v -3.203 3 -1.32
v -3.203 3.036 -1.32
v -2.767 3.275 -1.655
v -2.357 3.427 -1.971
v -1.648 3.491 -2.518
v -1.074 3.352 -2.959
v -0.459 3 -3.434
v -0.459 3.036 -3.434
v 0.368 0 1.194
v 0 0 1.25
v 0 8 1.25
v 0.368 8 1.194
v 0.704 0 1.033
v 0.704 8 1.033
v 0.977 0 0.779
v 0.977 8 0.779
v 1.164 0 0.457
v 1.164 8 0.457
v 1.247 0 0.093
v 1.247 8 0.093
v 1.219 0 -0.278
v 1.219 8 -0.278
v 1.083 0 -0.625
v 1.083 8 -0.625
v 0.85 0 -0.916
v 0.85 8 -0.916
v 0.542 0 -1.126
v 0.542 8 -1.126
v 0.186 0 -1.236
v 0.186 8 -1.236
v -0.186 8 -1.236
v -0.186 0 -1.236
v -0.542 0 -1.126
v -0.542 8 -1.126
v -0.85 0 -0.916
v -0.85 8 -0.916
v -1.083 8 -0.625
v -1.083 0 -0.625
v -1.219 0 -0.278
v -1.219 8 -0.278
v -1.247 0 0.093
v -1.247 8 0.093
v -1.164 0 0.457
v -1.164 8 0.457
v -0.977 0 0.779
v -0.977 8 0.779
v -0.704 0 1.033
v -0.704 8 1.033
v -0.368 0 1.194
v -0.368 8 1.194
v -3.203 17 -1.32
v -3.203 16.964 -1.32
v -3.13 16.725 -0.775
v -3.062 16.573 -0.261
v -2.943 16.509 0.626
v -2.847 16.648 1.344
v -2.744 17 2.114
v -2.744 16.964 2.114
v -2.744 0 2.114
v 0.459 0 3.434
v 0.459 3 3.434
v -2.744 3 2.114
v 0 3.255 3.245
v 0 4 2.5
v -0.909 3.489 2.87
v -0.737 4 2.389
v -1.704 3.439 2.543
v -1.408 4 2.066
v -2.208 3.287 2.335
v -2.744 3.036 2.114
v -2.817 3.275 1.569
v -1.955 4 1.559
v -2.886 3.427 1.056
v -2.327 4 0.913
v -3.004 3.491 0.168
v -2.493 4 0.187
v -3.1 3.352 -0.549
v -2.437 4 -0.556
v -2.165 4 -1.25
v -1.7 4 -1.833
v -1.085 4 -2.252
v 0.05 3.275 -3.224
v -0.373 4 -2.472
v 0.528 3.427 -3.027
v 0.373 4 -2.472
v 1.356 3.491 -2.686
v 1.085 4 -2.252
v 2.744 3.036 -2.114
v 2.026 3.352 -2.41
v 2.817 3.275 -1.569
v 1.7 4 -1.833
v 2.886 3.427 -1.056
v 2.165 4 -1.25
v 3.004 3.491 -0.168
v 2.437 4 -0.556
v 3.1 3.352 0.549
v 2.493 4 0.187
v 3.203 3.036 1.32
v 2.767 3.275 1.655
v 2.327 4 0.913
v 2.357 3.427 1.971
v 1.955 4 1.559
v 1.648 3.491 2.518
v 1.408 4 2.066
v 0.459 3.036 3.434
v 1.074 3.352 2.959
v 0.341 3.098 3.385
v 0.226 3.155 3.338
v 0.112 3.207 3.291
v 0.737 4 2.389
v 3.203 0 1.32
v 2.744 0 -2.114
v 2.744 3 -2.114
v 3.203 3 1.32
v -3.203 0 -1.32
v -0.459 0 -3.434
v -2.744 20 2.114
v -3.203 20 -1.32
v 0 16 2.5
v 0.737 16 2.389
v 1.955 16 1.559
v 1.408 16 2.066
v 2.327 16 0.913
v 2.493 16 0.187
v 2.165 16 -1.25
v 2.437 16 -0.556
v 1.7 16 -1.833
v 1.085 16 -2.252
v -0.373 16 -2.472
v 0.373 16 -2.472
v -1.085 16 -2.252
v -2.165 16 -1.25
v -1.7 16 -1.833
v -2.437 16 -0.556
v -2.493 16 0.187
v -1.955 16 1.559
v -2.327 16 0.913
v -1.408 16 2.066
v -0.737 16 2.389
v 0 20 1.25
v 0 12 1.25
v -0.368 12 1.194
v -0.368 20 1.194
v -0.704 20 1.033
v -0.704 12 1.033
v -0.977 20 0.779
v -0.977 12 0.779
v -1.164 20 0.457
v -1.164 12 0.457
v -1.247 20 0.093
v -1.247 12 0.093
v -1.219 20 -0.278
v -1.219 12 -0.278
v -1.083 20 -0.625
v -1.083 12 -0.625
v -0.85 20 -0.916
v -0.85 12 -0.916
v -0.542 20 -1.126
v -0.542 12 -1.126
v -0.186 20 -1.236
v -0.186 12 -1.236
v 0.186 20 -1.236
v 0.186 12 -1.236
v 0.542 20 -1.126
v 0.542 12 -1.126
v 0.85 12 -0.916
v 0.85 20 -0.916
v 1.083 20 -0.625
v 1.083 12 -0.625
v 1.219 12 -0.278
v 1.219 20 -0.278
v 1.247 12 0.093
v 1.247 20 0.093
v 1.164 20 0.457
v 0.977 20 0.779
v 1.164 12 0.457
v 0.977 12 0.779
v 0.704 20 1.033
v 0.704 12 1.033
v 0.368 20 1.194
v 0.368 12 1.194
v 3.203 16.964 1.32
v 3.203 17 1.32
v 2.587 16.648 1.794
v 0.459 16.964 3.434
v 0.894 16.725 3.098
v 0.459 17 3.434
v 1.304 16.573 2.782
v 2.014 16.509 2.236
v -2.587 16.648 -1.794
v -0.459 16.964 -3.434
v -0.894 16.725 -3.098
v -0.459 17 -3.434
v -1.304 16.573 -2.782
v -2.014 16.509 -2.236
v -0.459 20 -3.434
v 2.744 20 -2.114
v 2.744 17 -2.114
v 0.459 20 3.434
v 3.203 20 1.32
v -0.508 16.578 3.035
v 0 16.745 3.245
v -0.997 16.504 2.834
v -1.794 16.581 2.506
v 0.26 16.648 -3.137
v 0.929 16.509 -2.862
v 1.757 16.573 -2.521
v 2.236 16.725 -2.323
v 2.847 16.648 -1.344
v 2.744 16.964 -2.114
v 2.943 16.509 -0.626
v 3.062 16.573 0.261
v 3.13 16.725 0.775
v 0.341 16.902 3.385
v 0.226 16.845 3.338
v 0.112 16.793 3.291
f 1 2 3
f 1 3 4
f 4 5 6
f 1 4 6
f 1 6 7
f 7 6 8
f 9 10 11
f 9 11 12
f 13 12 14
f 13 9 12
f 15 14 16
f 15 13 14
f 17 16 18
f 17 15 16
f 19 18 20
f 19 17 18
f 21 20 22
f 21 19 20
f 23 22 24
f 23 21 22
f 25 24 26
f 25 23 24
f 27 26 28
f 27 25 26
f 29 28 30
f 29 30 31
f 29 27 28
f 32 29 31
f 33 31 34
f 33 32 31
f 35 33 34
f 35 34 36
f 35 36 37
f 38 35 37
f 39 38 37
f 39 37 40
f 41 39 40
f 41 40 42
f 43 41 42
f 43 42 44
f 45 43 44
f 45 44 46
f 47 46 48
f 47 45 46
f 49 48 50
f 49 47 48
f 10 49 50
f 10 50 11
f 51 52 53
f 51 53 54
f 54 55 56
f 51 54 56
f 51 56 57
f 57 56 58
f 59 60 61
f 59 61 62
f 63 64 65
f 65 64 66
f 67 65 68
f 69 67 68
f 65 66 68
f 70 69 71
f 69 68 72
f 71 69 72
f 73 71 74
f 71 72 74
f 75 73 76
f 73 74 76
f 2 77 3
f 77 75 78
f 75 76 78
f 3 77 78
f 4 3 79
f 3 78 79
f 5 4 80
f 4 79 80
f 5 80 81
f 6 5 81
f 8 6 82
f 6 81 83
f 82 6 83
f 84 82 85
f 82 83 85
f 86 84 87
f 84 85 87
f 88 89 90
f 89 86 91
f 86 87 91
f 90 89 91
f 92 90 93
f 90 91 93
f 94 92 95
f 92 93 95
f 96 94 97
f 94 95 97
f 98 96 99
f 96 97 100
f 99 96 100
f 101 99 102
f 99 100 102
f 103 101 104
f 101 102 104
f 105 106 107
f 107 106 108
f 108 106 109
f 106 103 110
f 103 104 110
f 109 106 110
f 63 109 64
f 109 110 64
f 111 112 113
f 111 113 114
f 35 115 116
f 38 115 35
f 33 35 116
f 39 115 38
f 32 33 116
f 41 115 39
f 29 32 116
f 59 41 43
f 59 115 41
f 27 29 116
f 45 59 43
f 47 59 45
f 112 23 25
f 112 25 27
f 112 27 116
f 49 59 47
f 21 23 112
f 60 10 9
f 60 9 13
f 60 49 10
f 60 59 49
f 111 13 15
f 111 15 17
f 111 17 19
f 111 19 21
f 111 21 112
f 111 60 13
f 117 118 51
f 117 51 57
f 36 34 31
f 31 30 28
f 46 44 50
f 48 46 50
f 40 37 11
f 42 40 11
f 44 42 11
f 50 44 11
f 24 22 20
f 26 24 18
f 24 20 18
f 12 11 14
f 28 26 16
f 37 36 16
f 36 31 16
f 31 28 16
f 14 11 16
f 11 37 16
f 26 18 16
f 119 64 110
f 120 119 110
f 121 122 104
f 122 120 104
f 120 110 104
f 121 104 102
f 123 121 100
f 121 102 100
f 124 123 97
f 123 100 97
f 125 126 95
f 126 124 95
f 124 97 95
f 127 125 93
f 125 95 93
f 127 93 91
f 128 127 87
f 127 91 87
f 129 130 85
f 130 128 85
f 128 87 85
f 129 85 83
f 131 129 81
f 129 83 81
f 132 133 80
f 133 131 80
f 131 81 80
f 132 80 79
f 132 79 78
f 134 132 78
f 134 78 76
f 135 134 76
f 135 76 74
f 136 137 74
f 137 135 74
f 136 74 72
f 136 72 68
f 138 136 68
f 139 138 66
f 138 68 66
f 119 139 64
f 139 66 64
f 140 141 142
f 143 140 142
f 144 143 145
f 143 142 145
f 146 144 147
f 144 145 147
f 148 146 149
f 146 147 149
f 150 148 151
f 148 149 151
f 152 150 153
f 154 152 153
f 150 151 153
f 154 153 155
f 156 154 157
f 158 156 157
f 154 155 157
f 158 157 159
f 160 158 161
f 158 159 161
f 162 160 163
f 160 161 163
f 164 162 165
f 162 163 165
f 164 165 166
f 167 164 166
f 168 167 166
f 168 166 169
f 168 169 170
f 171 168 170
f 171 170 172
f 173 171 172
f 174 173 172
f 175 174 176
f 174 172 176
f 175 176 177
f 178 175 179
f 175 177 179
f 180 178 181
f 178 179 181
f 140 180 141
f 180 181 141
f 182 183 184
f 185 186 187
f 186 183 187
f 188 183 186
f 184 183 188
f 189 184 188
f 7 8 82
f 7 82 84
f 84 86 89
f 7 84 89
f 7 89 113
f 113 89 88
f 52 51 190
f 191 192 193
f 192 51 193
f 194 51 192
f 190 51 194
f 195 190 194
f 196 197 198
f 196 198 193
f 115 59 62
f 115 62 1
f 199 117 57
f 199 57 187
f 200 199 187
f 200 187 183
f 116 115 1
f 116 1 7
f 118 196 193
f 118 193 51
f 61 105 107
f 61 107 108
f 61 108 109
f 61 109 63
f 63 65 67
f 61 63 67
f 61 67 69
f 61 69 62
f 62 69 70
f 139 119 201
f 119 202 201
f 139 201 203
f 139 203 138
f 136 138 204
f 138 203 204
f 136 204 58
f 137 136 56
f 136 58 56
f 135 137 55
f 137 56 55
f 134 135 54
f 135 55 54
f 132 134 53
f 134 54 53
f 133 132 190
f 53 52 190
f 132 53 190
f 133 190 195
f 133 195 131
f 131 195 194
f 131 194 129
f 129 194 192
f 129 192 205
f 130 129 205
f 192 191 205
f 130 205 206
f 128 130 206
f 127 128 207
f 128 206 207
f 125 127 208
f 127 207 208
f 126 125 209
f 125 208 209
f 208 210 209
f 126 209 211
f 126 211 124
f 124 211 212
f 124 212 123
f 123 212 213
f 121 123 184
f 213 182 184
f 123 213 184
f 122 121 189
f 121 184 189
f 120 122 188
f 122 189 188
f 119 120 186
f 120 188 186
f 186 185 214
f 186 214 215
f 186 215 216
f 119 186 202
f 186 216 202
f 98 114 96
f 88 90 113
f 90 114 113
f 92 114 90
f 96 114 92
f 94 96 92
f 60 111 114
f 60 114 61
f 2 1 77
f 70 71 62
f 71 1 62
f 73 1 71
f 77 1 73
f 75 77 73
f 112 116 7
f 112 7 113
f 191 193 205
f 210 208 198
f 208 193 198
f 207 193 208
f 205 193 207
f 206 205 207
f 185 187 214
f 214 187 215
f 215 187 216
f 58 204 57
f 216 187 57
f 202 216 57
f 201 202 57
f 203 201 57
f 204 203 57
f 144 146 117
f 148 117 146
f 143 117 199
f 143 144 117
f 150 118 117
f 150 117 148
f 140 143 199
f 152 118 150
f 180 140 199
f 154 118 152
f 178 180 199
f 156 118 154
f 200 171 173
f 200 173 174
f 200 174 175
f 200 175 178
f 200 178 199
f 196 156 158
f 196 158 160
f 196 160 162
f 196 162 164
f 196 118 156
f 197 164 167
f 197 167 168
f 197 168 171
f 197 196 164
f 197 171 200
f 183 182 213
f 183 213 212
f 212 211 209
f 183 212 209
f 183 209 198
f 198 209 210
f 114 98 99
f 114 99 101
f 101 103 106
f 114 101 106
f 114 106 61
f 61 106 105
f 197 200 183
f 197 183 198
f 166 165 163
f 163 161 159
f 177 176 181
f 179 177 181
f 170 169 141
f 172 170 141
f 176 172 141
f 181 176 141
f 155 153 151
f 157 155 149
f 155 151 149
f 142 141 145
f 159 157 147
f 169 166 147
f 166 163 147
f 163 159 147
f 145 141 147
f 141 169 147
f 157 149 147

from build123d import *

# Parameters (mm, degrees)
SKETCH_1_R          = 2.5
EXTRUDE_1_DEPTH     = 20
EXTRUDE_2_DEPTH     = 3
EXTRUDE_3_DEPTH     = 3
CHAMFER_1_SIZE      = 1
SKETCH_4_R          = 1.25
CUT_EXTRUDE_1_DEPTH = 8
CUT_EXTRUDE_START   = 8
SKETCH_5_R          = 1.25
CUT_EXTRUDE_2_DEPTH = 8


with BuildPart() as part:
    # 草图1 → 凸台-拉伸1 (new body)
    with BuildSketch(Plane(origin=(0, 0, 0), x_dir=(1, 0, 0), z_dir=(0, 1, 0))):
        with Locations(Location((0, 0, 0), (0, 0, 270))):
            Circle(SKETCH_1_R)
    extrude(amount=EXTRUDE_1_DEPTH)

    # 草图2 → 凸台-拉伸2 (add)
    with BuildSketch(Plane(origin=(0, 20, 0), x_dir=(1, 0, 0), z_dir=(0, 1, 0))):
        Polygon((3.202903935, -1.319623577), (2.744279509, 2.113984385), (-0.458624426, 3.433607962), (-3.202903935, 1.319623577), (-2.744279509, -2.113984385), (0.458624426, -3.433607962), align=None)
    extrude(amount=-EXTRUDE_2_DEPTH)

    # 草图3 → 凸台-拉伸3 (add)
    with BuildSketch(Plane.XZ):
        Polygon((3.202903935, 1.319623577), (0.458624426, 3.433607962), (-2.744279509, 2.113984385), (-3.202903935, -1.319623577), (-0.458624426, -3.433607962), (2.744279509, -2.113984385), align=None)
    extrude(amount=-EXTRUDE_3_DEPTH)

    # 倒角1
    # the kernel refuses this chamfer: 1 mm, written as the material it adds along each edge
    with BuildSketch(Plane(origin=(0, 17, 0), x_dir=(0, 0, 1), z_dir=(1, 0, 0))) as chamfer_1_piece_1_section:
        Polygon((2.5, CHAMFER_1_SIZE), (2.5 + CHAMFER_1_SIZE, 0), (2.5, 0), align=None)
    chamfer_1_piece_1 = revolve(axis=Axis((0, 17, 0), (0, -1, 0)), mode=Mode.PRIVATE)
    chamfer_1_piece_1 = split(chamfer_1_piece_1, bisect_by=Plane(origin=(2.585980682, 16.482096178, -3.299128656), z_dir=(-0.9911972405355005, 0, 0.13239346794615373)), keep=Keep.TOP, mode=Mode.PRIVATE)
    chamfer_1_piece_1 = split(chamfer_1_piece_1, bisect_by=Plane(origin=(3.258731824, 16.482096178, 1.276618014), z_dir=(-0.61025472680424, 0, -0.7922052564917015)), keep=Keep.TOP, mode=Mode.PRIVATE)
    chamfer_1_piece_1 = split(chamfer_1_piece_1, bisect_by=Plane(origin=(0.102470937, 16.482096178, -3.202431915), z_dir=(-0.3809425137312606, 0, 0.924598724437855)), keep=Keep.TOP, mode=Mode.PRIVATE)
    chamfer_1_piece_1 = split(chamfer_1_piece_1, bisect_by=Plane(origin=(-2.183184145, 16.482096178, 2.345160432), z_dir=(0.38094251373126053, 0, -0.924598724437855)), keep=Keep.TOP, mode=Mode.PRIVATE)
    chamfer_1_piece_1 = split(chamfer_1_piece_1, bisect_by=Plane(origin=(-0.402796537, 16.482096178, -3.476613525), z_dir=(0.6102547268042401, 0, 0.7922052564917015)), keep=Keep.TOP, mode=Mode.PRIVATE)
    chamfer_1_piece_1 = split(chamfer_1_piece_1, bisect_by=Plane(origin=(-3.361202761, 16.482096178, -2.504767848), z_dir=(0.9911972405355005, 0, -0.1323934679461537)), keep=Keep.TOP, mode=Mode.PRIVATE)
    add(chamfer_1_piece_1)
    with BuildSketch(Plane(origin=(0, 3, 0), x_dir=(0, 0, 1), z_dir=(1, 0, 0))) as chamfer_1_piece_2_section:
        Polygon((2.5 + CHAMFER_1_SIZE, 0), (2.5, -CHAMFER_1_SIZE), (2.5, 0), align=None)
    chamfer_1_piece_2 = revolve(axis=Axis((0, 3, 0), (0, -1, 0)), mode=Mode.PRIVATE)
    chamfer_1_piece_2 = split(chamfer_1_piece_2, bisect_by=Plane(origin=(3.258731824, 3.517903822, 1.276618014), z_dir=(-0.61025472680424, 0, -0.7922052564917015)), keep=Keep.TOP, mode=Mode.PRIVATE)
    chamfer_1_piece_2 = split(chamfer_1_piece_2, bisect_by=Plane(origin=(2.585980682, 3.517903822, -3.299128656), z_dir=(-0.9911972405355005, 0, 0.13239346794615373)), keep=Keep.TOP, mode=Mode.PRIVATE)
    chamfer_1_piece_2 = split(chamfer_1_piece_2, bisect_by=Plane(origin=(-2.183184145, 3.517903822, 2.345160432), z_dir=(0.38094251373126053, 0, -0.924598724437855)), keep=Keep.TOP, mode=Mode.PRIVATE)
    chamfer_1_piece_2 = split(chamfer_1_piece_2, bisect_by=Plane(origin=(0.102470937, 3.517903822, -3.202431915), z_dir=(-0.3809425137312606, 0, 0.924598724437855)), keep=Keep.TOP, mode=Mode.PRIVATE)
    chamfer_1_piece_2 = split(chamfer_1_piece_2, bisect_by=Plane(origin=(-3.361202761, 3.517903822, -2.504767848), z_dir=(0.9911972405355005, 0, -0.1323934679461537)), keep=Keep.TOP, mode=Mode.PRIVATE)
    chamfer_1_piece_2 = split(chamfer_1_piece_2, bisect_by=Plane(origin=(-0.402796537, 3.517903822, -3.476613525), z_dir=(0.6102547268042401, 0, 0.7922052564917015)), keep=Keep.TOP, mode=Mode.PRIVATE)
    add(chamfer_1_piece_2)

    # 草图4 → 切除-拉伸1 (cut)
    with BuildSketch(Plane(origin=(0, 0, 0), x_dir=(-1, 0, 0), z_dir=(0, 1, 0))):
        with Locations(Location((0, 0, 0), (0, 0, 90))):
            Circle(SKETCH_4_R)
    extrude(amount=CUT_EXTRUDE_1_DEPTH, mode=Mode.SUBTRACT)

    # 草图5 → 切除-拉伸2 (cut)
    with BuildSketch(Plane(origin=(0, 20, 0), x_dir=(-1, 0, 0), z_dir=(0, -1, 0)).offset(CUT_EXTRUDE_START)):
        with Locations(Location((0, 0, 0), (0, 0, 270))):
            Circle(SKETCH_5_R)
    extrude(amount=-CUT_EXTRUDE_2_DEPTH, mode=Mode.SUBTRACT)


solid = part.part
